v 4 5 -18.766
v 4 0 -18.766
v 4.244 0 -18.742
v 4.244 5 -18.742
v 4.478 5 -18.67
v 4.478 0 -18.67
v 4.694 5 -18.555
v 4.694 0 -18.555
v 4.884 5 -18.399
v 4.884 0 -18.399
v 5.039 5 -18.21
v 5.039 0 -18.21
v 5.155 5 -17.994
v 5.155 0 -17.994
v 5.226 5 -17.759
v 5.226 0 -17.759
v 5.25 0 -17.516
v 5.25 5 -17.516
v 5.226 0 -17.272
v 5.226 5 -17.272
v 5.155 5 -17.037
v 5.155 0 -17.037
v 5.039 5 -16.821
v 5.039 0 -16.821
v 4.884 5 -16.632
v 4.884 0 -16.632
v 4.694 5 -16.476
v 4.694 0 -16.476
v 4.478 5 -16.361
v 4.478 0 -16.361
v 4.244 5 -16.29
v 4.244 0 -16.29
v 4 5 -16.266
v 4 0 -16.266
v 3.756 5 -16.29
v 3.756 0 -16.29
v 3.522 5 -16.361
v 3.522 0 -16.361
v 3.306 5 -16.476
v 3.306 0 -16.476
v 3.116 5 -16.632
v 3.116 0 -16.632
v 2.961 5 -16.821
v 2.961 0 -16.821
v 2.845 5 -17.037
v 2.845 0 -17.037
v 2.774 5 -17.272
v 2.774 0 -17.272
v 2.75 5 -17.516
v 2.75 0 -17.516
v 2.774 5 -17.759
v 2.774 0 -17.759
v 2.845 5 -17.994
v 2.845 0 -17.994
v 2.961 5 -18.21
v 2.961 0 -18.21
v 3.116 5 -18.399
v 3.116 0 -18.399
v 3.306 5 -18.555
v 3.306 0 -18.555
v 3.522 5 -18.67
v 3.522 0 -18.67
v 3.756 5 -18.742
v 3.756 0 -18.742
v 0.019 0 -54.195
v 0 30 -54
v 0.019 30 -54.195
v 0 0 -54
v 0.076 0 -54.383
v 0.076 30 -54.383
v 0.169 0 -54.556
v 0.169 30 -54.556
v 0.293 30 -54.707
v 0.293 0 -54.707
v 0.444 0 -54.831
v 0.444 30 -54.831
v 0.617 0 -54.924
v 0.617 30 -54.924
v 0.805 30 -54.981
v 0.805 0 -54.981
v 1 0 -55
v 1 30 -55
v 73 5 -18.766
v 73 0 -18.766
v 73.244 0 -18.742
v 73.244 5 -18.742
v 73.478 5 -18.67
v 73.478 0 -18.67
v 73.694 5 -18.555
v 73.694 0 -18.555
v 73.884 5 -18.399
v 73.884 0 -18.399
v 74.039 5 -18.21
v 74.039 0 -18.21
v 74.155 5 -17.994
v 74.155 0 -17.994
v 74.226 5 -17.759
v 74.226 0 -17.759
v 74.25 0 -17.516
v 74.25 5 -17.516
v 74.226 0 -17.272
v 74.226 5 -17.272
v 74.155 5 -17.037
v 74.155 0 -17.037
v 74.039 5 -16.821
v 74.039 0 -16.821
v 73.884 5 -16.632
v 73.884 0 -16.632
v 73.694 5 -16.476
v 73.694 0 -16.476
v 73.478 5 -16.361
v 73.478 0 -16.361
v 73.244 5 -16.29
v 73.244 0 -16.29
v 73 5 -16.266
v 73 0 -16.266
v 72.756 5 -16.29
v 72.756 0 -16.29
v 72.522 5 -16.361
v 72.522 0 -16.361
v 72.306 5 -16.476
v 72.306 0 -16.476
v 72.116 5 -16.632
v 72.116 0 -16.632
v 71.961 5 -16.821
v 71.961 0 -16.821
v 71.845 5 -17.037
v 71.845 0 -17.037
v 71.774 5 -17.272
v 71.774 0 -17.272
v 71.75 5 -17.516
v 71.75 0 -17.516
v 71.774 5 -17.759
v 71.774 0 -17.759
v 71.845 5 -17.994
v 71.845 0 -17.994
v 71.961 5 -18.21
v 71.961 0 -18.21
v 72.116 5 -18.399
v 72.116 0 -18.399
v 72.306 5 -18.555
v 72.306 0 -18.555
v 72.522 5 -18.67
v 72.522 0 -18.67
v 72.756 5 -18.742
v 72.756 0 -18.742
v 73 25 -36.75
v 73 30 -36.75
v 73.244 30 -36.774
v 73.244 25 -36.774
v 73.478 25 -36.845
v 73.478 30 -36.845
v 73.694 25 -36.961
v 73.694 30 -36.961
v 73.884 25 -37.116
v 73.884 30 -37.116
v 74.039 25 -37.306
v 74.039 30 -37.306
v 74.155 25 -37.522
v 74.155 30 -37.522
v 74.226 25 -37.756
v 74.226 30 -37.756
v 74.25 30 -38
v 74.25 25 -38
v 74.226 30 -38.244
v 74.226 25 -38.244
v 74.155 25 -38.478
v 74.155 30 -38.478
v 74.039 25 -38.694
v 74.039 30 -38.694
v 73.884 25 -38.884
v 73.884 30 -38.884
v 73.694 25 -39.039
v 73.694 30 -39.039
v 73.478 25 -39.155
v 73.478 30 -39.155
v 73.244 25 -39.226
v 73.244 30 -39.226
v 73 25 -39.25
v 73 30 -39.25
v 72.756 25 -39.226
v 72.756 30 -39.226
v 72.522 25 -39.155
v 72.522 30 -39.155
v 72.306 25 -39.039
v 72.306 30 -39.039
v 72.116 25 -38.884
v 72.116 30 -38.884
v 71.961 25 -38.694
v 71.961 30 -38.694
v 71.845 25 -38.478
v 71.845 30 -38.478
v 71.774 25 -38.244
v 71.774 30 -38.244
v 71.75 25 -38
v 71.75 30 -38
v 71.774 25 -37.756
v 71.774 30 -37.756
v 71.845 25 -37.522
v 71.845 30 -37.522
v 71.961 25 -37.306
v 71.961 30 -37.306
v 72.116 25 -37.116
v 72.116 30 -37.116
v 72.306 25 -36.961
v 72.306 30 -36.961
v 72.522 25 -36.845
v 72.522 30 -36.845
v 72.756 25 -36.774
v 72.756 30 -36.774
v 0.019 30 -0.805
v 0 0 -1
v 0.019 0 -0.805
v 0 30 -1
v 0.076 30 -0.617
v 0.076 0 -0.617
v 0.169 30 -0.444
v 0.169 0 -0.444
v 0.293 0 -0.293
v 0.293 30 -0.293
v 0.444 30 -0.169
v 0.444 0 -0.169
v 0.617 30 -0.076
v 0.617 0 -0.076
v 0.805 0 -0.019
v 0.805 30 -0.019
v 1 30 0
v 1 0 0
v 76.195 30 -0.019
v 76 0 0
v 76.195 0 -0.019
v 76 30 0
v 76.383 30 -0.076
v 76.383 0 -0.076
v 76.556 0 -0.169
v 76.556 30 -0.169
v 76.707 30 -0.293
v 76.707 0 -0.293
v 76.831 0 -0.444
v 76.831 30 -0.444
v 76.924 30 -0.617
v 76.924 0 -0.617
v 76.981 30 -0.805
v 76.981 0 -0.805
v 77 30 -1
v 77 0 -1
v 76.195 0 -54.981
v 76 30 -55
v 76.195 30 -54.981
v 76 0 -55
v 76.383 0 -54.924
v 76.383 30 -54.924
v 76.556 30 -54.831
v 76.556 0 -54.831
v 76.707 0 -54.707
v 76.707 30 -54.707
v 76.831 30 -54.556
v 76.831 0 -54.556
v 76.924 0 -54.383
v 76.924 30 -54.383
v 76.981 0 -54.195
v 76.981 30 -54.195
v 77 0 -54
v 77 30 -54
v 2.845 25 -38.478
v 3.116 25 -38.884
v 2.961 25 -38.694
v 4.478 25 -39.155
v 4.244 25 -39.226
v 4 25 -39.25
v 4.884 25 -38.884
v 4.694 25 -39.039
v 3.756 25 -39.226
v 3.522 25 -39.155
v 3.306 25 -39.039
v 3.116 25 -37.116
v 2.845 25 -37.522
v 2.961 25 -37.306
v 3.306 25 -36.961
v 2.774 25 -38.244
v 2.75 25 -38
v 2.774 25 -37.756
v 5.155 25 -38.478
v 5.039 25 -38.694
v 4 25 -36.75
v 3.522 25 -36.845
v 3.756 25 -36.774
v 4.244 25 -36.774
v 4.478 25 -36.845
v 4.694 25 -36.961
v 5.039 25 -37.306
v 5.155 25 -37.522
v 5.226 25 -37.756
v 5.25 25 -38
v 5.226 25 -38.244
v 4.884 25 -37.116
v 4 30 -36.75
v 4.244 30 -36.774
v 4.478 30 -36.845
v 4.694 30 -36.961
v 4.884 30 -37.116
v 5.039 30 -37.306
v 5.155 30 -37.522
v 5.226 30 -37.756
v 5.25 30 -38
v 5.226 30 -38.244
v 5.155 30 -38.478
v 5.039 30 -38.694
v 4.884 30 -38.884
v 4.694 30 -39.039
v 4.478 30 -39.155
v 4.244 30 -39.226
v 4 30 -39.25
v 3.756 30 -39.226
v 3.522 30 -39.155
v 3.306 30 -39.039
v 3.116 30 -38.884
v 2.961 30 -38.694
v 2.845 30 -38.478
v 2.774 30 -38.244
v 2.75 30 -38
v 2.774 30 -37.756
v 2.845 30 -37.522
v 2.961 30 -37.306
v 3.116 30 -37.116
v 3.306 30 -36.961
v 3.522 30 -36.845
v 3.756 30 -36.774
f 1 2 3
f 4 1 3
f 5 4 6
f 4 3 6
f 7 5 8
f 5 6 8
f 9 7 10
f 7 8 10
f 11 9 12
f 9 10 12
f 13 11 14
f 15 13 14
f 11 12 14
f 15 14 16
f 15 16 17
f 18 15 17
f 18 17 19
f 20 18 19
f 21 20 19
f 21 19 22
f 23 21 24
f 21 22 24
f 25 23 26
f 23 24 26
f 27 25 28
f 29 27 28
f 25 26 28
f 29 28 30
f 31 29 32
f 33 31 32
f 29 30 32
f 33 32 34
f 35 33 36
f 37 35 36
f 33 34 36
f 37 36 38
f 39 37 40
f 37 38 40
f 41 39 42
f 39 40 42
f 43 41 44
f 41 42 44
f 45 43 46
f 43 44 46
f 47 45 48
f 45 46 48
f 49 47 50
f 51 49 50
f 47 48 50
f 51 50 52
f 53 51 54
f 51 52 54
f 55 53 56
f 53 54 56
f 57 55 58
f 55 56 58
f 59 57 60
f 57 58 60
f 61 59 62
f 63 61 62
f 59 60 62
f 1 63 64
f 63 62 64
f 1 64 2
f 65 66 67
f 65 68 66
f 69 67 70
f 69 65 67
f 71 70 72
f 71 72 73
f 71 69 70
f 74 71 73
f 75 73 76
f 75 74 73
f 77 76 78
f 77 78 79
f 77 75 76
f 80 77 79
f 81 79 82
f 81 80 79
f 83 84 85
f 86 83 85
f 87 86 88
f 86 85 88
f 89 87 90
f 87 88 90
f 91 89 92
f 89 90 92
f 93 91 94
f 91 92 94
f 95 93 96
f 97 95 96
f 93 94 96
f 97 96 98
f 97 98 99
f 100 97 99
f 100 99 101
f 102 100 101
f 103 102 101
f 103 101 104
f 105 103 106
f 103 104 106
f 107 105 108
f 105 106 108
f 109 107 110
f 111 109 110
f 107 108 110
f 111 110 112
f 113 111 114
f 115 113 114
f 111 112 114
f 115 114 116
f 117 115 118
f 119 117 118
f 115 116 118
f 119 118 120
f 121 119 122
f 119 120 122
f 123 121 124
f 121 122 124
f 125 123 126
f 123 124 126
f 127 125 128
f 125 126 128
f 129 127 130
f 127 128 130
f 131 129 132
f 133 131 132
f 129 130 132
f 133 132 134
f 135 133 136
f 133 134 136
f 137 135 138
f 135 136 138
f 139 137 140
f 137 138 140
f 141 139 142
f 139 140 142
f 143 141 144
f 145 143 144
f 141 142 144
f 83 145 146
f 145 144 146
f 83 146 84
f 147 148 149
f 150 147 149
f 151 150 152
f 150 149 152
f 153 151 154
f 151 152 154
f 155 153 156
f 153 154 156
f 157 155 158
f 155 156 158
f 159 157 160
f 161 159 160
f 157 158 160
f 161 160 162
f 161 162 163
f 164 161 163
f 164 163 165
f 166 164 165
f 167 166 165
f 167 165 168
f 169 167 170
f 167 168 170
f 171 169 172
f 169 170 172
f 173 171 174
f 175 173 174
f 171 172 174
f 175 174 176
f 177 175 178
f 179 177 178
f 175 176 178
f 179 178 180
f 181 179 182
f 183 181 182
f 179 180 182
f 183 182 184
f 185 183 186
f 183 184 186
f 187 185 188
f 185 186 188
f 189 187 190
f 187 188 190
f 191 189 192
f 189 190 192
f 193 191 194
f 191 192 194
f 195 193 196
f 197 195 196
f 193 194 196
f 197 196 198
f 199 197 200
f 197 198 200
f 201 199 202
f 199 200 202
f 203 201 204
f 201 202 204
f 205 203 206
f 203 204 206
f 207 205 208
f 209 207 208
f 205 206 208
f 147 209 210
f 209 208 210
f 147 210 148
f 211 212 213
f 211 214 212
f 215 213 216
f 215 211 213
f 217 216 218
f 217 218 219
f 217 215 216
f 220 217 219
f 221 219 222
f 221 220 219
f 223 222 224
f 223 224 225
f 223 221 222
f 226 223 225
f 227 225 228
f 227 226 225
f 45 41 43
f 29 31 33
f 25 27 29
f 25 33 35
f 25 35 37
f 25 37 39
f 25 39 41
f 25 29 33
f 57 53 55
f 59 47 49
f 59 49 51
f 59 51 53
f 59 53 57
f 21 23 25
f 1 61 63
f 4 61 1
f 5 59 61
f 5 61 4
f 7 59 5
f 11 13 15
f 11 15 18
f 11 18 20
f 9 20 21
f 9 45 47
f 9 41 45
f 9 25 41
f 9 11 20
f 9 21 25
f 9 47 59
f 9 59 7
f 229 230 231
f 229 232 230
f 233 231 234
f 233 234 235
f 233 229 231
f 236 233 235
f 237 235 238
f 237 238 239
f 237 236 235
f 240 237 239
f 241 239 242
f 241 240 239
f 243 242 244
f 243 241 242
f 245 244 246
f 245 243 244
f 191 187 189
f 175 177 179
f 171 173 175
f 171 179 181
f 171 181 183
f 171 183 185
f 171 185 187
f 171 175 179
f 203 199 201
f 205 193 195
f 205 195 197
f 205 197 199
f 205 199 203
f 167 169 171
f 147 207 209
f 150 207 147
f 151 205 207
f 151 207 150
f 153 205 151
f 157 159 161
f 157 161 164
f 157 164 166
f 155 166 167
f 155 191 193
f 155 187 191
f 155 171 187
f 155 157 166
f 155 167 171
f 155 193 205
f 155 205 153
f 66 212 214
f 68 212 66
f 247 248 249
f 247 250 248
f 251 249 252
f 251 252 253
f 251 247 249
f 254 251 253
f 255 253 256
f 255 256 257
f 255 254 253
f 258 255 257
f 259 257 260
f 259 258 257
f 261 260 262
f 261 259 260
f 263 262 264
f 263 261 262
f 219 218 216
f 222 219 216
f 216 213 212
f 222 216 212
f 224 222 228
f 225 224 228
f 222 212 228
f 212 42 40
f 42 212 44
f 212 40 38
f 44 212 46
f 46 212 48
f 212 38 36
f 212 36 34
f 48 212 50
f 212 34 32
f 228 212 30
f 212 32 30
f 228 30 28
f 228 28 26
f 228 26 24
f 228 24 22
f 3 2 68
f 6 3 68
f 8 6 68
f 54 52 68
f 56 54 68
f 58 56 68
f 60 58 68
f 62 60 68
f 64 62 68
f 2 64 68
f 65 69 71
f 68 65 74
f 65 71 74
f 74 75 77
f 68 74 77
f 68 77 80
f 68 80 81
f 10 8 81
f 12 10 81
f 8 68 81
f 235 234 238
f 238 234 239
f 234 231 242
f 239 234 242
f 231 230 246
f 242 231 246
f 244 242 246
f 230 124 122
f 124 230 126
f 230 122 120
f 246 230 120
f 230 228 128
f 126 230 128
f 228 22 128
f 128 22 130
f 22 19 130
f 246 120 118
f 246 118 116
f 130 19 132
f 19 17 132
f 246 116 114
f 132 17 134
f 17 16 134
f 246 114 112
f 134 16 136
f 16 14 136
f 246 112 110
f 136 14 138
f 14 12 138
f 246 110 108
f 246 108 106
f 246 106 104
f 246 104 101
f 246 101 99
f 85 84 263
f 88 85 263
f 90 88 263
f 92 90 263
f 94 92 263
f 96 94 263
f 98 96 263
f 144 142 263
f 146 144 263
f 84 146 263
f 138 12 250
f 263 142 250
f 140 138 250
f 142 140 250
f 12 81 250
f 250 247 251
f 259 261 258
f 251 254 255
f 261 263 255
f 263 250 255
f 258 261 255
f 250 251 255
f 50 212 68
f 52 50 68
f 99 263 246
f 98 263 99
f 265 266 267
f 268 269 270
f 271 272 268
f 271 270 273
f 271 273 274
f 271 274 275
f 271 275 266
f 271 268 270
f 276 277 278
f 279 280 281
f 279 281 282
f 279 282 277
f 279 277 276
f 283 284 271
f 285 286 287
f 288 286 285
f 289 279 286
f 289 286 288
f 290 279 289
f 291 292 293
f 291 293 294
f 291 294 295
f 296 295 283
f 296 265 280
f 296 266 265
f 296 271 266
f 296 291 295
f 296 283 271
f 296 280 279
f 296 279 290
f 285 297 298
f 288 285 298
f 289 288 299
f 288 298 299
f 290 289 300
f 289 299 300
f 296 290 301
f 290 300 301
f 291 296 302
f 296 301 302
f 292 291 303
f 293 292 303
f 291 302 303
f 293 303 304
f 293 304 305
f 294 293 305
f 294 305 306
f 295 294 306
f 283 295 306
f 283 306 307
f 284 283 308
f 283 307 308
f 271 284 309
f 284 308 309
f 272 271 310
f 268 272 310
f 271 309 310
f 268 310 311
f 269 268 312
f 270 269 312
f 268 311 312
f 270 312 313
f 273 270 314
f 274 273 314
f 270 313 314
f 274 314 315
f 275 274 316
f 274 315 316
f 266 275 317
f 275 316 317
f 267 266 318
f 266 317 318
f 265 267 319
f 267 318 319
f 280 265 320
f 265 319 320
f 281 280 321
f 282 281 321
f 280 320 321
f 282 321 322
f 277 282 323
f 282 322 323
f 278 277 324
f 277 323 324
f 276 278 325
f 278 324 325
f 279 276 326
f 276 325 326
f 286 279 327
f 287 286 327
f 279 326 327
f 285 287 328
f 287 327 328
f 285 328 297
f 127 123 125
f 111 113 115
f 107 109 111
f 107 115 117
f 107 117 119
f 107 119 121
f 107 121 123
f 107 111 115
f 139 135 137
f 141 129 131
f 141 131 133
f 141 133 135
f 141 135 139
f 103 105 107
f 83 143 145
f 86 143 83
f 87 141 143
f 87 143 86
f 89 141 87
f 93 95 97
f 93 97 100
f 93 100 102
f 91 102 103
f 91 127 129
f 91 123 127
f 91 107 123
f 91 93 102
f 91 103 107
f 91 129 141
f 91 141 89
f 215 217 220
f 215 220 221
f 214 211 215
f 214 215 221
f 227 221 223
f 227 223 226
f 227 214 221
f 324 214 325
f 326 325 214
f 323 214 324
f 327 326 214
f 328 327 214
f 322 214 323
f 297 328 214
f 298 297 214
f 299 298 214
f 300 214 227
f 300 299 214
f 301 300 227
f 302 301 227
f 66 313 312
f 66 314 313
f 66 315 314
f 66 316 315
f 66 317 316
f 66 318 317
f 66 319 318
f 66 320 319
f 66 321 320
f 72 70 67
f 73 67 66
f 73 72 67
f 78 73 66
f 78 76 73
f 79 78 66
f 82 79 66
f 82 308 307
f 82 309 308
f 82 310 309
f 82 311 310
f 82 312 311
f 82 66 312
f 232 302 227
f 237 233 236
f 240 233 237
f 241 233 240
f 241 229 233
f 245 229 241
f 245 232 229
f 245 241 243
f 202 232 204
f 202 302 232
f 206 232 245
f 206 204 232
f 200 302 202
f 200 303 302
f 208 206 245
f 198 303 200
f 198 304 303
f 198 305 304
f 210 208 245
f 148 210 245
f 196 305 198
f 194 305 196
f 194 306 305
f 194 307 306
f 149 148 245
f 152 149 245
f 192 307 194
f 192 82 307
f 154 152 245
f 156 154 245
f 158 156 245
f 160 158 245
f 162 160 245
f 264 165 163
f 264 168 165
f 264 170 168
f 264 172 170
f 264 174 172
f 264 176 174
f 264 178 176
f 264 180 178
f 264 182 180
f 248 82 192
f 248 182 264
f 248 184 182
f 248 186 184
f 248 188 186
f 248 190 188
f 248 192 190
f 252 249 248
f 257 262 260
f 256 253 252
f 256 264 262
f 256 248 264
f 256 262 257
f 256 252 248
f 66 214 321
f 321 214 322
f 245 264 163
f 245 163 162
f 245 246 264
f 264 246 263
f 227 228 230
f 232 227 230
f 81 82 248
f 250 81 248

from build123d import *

# Parameters (mm, degrees)
SKETCH1_W           = 77
SKETCH1_H           = 60
BOSS_EXTRUDE1_DEPTH = 30
FILLET1_R           = 1
SKETCH2_W           = 77
SKETCH2_H           = 5.029469172
CUT_EXTRUDE1_DEPTH  = 40
FILLET3_R           = 1
SKETCH5_R           = 1.25
CUT_EXTRUDE4_DEPTH  = 5
SKETCH6_R           = 1.25
CUT_EXTRUDE5_DEPTH  = 5
SKETCH7_R           = 1.25
CUT_EXTRUDE6_DEPTH  = 5


with BuildPart() as part:
    # Sketch1 → Boss-Extrude1 (new body)
    with BuildSketch(Plane(origin=(0, 0, 0), x_dir=(1, 0, 0), z_dir=(0, 1, 0))):
        with Locations((38.5, 30)):
            Rectangle(SKETCH1_W, SKETCH1_H)
    extrude(amount=BOSS_EXTRUDE1_DEPTH)

    # Fillet1
    fillet1_edges = [part.edges().sort_by_distance(p)[0] for p in [
        (0, 15, -60),
        (77, 15, -60),
        (77, 15, 0),
        (0, 15, 0),
    ]]
    fillet(fillet1_edges, radius=FILLET1_R)

    # Sketch2 → Cut-Extrude1 (cut)
    with BuildSketch(Plane(origin=(0, 30, 0), x_dir=(1, 0, 0), z_dir=(0, 1, 0))):
        with Locations((38.5, 57.514734586)):
            Rectangle(SKETCH2_W, SKETCH2_H)
    extrude(amount=-CUT_EXTRUDE1_DEPTH, mode=Mode.SUBTRACT)

    # Fillet3
    fillet3_edges = [part.edges().sort_by_distance(p)[0] for p in [
        (0, 15, -55),
        (77, 15, -55),
    ]]
    fillet(fillet3_edges, radius=FILLET3_R)

    # Sketch5 → Cut-Extrude4 (cut)
    with BuildSketch(Plane.XZ):
        with Locations(Location((73, -17.515605611, 0), (0, 0, 270))):
            Circle(SKETCH5_R)
    extrude(amount=-CUT_EXTRUDE4_DEPTH, mode=Mode.SUBTRACT)

    # Sketch6 → Cut-Extrude5 (cut)
    with BuildSketch(Plane.XZ):
        with Locations(Location((4, -17.515605611, 0), (0, 0, 270))):
            Circle(SKETCH6_R)
    extrude(amount=-CUT_EXTRUDE5_DEPTH, mode=Mode.SUBTRACT)

    # Sketch7 → Cut-Extrude6 (cut)
    with BuildSketch(Plane(origin=(0, 30, 0), x_dir=(1, 0, 0), z_dir=(0, 1, 0))):
        with Locations(Location((73, 38, 0), (0, 0, 270))):
            Circle(SKETCH7_R)
        with Locations(Location((4, 38, 0), (0, 0, 270))):
            Circle(SKETCH7_R)
    extrude(amount=-CUT_EXTRUDE6_DEPTH, mode=Mode.SUBTRACT)


solid = part.part
